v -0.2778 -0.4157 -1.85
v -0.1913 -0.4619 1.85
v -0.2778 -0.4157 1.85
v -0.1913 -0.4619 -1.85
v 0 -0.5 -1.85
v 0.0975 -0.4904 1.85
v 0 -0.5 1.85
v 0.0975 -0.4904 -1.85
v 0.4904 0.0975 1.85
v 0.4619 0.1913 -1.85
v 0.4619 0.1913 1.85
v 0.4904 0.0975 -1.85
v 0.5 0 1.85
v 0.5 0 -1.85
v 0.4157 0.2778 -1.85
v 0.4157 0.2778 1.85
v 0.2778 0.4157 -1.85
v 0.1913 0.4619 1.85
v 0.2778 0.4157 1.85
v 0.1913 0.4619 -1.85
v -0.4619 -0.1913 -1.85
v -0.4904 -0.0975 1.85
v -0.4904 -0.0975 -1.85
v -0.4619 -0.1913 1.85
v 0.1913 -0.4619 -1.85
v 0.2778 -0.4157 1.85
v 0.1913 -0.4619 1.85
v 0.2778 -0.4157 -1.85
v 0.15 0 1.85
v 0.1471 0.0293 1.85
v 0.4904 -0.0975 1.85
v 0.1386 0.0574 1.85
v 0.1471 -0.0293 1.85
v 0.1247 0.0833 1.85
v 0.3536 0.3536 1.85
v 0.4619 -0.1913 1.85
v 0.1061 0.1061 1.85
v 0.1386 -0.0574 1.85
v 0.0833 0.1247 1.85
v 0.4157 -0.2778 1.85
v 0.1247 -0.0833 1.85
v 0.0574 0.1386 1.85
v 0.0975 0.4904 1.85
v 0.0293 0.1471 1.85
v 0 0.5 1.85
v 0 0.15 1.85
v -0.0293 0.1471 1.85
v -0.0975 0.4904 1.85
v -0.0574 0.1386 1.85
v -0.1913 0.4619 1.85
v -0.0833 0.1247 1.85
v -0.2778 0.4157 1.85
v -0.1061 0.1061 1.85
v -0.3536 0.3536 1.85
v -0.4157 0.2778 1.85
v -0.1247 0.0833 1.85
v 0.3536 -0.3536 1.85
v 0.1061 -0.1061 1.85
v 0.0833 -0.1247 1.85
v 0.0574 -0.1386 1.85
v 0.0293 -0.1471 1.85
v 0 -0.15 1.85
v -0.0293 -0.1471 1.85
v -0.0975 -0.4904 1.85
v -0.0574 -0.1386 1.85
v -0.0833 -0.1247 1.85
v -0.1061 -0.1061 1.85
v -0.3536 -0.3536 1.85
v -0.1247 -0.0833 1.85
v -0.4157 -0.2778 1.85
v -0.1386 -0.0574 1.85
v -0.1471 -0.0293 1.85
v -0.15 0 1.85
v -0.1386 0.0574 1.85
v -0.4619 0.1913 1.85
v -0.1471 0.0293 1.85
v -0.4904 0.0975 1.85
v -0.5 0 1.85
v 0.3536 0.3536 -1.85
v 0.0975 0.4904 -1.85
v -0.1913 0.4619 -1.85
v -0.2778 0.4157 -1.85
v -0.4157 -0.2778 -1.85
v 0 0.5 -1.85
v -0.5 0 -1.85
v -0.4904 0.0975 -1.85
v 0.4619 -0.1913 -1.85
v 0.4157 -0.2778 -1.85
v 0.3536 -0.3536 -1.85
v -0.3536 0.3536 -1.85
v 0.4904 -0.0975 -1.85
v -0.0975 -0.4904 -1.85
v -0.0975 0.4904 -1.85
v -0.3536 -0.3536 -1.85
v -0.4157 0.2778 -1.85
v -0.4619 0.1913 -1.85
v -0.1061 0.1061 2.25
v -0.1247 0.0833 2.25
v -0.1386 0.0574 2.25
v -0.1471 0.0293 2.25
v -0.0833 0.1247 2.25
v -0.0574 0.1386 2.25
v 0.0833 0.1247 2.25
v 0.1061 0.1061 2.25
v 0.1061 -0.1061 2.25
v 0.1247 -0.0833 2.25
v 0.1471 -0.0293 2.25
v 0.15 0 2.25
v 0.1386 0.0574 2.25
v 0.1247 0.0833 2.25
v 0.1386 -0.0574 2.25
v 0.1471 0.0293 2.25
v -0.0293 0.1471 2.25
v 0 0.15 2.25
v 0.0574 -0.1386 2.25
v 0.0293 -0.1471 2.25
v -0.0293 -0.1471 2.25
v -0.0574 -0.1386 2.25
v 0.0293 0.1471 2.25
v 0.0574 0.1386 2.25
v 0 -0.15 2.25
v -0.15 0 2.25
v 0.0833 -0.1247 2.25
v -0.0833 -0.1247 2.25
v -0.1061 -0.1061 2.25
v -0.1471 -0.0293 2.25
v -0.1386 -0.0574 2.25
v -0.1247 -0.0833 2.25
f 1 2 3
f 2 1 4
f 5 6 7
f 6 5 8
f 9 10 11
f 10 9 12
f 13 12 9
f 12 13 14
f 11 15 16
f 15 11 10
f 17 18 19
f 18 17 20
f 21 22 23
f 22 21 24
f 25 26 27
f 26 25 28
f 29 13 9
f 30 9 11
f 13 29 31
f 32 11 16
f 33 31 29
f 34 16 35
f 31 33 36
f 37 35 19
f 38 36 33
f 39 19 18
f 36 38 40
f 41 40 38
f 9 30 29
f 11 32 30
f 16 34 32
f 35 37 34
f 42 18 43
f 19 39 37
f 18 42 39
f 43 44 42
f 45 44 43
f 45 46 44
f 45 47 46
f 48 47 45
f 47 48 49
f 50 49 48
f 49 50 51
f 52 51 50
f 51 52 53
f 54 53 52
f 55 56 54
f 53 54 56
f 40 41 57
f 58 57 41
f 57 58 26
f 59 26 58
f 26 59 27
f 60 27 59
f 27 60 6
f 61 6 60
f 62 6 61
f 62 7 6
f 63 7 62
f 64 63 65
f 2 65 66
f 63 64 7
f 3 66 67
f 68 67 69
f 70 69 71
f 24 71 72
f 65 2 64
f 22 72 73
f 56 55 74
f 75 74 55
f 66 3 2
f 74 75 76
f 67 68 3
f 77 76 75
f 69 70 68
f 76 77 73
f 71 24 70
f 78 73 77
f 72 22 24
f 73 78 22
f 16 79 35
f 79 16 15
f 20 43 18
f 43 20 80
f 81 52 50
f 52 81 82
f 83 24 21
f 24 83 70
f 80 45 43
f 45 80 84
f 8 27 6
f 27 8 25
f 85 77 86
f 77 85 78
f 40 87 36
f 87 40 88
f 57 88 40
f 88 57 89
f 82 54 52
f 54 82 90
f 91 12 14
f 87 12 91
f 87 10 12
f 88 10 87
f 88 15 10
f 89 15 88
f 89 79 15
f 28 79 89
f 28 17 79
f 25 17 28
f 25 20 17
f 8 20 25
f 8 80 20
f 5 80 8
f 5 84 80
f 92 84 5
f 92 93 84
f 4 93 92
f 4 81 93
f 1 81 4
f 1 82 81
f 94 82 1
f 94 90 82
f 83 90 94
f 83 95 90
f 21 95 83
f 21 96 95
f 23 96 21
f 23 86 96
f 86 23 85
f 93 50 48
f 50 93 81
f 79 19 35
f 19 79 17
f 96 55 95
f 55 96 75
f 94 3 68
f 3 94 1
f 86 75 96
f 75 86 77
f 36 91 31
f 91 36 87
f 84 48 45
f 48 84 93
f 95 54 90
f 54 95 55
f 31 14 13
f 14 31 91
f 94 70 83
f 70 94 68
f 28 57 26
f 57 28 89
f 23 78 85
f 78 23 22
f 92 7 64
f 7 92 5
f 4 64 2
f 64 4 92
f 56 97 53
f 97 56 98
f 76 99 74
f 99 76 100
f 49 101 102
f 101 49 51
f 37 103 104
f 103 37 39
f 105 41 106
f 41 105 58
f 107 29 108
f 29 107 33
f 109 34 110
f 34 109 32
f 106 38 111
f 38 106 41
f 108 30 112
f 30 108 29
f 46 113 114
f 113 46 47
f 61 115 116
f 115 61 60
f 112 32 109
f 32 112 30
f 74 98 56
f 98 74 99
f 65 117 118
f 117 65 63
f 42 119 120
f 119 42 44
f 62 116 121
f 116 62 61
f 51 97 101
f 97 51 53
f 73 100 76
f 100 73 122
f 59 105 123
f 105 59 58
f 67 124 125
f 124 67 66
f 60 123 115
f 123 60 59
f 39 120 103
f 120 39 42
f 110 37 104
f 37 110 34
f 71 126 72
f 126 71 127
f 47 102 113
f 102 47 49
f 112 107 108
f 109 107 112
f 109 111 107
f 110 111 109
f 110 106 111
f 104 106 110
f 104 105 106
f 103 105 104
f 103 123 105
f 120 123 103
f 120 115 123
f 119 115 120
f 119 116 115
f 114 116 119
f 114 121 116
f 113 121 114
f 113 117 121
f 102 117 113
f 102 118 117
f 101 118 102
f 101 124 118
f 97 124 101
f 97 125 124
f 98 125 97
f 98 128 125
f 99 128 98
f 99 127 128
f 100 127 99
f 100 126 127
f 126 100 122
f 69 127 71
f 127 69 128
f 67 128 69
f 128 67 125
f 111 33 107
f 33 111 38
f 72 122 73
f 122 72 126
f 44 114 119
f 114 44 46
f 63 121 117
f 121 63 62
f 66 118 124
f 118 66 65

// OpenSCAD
// Parameters
body_diameter_mm = 1.0; //[0.5:2.0:0.05]
overall_height_mm = 4.7; //[2.35:9.4:0.1]
body_height_mm = 3.7; //[1.85:7.4:0.1]
lever_height_mm = 1.0; //[0.5:2.0:0.05]
lever_diameter_mm = 0.3; //[0.15:0.6:0.01]
overlap_mm = 0.6; //[0.2:1.5:0.1]

// Toggle switch - complete geometry
module toggle() {
  union() {
    // Cylindrical body
    color("DimGray") {
      translate([0, 0, 0])
        cylinder(h=body_height_mm, r=body_diameter_mm/2, center=true, $fn=32);
    }
    // Toggle lever
    color("Silver") {
      translate([0, 0, body_height_mm/2 + lever_height_mm/2 - overlap_mm])
        cylinder(h=lever_height_mm, r=lever_diameter_mm/2, center=true, $fn=32);
    }
  }
}

// Assembly
module assembly() {
  toggle();
}

assembly();
